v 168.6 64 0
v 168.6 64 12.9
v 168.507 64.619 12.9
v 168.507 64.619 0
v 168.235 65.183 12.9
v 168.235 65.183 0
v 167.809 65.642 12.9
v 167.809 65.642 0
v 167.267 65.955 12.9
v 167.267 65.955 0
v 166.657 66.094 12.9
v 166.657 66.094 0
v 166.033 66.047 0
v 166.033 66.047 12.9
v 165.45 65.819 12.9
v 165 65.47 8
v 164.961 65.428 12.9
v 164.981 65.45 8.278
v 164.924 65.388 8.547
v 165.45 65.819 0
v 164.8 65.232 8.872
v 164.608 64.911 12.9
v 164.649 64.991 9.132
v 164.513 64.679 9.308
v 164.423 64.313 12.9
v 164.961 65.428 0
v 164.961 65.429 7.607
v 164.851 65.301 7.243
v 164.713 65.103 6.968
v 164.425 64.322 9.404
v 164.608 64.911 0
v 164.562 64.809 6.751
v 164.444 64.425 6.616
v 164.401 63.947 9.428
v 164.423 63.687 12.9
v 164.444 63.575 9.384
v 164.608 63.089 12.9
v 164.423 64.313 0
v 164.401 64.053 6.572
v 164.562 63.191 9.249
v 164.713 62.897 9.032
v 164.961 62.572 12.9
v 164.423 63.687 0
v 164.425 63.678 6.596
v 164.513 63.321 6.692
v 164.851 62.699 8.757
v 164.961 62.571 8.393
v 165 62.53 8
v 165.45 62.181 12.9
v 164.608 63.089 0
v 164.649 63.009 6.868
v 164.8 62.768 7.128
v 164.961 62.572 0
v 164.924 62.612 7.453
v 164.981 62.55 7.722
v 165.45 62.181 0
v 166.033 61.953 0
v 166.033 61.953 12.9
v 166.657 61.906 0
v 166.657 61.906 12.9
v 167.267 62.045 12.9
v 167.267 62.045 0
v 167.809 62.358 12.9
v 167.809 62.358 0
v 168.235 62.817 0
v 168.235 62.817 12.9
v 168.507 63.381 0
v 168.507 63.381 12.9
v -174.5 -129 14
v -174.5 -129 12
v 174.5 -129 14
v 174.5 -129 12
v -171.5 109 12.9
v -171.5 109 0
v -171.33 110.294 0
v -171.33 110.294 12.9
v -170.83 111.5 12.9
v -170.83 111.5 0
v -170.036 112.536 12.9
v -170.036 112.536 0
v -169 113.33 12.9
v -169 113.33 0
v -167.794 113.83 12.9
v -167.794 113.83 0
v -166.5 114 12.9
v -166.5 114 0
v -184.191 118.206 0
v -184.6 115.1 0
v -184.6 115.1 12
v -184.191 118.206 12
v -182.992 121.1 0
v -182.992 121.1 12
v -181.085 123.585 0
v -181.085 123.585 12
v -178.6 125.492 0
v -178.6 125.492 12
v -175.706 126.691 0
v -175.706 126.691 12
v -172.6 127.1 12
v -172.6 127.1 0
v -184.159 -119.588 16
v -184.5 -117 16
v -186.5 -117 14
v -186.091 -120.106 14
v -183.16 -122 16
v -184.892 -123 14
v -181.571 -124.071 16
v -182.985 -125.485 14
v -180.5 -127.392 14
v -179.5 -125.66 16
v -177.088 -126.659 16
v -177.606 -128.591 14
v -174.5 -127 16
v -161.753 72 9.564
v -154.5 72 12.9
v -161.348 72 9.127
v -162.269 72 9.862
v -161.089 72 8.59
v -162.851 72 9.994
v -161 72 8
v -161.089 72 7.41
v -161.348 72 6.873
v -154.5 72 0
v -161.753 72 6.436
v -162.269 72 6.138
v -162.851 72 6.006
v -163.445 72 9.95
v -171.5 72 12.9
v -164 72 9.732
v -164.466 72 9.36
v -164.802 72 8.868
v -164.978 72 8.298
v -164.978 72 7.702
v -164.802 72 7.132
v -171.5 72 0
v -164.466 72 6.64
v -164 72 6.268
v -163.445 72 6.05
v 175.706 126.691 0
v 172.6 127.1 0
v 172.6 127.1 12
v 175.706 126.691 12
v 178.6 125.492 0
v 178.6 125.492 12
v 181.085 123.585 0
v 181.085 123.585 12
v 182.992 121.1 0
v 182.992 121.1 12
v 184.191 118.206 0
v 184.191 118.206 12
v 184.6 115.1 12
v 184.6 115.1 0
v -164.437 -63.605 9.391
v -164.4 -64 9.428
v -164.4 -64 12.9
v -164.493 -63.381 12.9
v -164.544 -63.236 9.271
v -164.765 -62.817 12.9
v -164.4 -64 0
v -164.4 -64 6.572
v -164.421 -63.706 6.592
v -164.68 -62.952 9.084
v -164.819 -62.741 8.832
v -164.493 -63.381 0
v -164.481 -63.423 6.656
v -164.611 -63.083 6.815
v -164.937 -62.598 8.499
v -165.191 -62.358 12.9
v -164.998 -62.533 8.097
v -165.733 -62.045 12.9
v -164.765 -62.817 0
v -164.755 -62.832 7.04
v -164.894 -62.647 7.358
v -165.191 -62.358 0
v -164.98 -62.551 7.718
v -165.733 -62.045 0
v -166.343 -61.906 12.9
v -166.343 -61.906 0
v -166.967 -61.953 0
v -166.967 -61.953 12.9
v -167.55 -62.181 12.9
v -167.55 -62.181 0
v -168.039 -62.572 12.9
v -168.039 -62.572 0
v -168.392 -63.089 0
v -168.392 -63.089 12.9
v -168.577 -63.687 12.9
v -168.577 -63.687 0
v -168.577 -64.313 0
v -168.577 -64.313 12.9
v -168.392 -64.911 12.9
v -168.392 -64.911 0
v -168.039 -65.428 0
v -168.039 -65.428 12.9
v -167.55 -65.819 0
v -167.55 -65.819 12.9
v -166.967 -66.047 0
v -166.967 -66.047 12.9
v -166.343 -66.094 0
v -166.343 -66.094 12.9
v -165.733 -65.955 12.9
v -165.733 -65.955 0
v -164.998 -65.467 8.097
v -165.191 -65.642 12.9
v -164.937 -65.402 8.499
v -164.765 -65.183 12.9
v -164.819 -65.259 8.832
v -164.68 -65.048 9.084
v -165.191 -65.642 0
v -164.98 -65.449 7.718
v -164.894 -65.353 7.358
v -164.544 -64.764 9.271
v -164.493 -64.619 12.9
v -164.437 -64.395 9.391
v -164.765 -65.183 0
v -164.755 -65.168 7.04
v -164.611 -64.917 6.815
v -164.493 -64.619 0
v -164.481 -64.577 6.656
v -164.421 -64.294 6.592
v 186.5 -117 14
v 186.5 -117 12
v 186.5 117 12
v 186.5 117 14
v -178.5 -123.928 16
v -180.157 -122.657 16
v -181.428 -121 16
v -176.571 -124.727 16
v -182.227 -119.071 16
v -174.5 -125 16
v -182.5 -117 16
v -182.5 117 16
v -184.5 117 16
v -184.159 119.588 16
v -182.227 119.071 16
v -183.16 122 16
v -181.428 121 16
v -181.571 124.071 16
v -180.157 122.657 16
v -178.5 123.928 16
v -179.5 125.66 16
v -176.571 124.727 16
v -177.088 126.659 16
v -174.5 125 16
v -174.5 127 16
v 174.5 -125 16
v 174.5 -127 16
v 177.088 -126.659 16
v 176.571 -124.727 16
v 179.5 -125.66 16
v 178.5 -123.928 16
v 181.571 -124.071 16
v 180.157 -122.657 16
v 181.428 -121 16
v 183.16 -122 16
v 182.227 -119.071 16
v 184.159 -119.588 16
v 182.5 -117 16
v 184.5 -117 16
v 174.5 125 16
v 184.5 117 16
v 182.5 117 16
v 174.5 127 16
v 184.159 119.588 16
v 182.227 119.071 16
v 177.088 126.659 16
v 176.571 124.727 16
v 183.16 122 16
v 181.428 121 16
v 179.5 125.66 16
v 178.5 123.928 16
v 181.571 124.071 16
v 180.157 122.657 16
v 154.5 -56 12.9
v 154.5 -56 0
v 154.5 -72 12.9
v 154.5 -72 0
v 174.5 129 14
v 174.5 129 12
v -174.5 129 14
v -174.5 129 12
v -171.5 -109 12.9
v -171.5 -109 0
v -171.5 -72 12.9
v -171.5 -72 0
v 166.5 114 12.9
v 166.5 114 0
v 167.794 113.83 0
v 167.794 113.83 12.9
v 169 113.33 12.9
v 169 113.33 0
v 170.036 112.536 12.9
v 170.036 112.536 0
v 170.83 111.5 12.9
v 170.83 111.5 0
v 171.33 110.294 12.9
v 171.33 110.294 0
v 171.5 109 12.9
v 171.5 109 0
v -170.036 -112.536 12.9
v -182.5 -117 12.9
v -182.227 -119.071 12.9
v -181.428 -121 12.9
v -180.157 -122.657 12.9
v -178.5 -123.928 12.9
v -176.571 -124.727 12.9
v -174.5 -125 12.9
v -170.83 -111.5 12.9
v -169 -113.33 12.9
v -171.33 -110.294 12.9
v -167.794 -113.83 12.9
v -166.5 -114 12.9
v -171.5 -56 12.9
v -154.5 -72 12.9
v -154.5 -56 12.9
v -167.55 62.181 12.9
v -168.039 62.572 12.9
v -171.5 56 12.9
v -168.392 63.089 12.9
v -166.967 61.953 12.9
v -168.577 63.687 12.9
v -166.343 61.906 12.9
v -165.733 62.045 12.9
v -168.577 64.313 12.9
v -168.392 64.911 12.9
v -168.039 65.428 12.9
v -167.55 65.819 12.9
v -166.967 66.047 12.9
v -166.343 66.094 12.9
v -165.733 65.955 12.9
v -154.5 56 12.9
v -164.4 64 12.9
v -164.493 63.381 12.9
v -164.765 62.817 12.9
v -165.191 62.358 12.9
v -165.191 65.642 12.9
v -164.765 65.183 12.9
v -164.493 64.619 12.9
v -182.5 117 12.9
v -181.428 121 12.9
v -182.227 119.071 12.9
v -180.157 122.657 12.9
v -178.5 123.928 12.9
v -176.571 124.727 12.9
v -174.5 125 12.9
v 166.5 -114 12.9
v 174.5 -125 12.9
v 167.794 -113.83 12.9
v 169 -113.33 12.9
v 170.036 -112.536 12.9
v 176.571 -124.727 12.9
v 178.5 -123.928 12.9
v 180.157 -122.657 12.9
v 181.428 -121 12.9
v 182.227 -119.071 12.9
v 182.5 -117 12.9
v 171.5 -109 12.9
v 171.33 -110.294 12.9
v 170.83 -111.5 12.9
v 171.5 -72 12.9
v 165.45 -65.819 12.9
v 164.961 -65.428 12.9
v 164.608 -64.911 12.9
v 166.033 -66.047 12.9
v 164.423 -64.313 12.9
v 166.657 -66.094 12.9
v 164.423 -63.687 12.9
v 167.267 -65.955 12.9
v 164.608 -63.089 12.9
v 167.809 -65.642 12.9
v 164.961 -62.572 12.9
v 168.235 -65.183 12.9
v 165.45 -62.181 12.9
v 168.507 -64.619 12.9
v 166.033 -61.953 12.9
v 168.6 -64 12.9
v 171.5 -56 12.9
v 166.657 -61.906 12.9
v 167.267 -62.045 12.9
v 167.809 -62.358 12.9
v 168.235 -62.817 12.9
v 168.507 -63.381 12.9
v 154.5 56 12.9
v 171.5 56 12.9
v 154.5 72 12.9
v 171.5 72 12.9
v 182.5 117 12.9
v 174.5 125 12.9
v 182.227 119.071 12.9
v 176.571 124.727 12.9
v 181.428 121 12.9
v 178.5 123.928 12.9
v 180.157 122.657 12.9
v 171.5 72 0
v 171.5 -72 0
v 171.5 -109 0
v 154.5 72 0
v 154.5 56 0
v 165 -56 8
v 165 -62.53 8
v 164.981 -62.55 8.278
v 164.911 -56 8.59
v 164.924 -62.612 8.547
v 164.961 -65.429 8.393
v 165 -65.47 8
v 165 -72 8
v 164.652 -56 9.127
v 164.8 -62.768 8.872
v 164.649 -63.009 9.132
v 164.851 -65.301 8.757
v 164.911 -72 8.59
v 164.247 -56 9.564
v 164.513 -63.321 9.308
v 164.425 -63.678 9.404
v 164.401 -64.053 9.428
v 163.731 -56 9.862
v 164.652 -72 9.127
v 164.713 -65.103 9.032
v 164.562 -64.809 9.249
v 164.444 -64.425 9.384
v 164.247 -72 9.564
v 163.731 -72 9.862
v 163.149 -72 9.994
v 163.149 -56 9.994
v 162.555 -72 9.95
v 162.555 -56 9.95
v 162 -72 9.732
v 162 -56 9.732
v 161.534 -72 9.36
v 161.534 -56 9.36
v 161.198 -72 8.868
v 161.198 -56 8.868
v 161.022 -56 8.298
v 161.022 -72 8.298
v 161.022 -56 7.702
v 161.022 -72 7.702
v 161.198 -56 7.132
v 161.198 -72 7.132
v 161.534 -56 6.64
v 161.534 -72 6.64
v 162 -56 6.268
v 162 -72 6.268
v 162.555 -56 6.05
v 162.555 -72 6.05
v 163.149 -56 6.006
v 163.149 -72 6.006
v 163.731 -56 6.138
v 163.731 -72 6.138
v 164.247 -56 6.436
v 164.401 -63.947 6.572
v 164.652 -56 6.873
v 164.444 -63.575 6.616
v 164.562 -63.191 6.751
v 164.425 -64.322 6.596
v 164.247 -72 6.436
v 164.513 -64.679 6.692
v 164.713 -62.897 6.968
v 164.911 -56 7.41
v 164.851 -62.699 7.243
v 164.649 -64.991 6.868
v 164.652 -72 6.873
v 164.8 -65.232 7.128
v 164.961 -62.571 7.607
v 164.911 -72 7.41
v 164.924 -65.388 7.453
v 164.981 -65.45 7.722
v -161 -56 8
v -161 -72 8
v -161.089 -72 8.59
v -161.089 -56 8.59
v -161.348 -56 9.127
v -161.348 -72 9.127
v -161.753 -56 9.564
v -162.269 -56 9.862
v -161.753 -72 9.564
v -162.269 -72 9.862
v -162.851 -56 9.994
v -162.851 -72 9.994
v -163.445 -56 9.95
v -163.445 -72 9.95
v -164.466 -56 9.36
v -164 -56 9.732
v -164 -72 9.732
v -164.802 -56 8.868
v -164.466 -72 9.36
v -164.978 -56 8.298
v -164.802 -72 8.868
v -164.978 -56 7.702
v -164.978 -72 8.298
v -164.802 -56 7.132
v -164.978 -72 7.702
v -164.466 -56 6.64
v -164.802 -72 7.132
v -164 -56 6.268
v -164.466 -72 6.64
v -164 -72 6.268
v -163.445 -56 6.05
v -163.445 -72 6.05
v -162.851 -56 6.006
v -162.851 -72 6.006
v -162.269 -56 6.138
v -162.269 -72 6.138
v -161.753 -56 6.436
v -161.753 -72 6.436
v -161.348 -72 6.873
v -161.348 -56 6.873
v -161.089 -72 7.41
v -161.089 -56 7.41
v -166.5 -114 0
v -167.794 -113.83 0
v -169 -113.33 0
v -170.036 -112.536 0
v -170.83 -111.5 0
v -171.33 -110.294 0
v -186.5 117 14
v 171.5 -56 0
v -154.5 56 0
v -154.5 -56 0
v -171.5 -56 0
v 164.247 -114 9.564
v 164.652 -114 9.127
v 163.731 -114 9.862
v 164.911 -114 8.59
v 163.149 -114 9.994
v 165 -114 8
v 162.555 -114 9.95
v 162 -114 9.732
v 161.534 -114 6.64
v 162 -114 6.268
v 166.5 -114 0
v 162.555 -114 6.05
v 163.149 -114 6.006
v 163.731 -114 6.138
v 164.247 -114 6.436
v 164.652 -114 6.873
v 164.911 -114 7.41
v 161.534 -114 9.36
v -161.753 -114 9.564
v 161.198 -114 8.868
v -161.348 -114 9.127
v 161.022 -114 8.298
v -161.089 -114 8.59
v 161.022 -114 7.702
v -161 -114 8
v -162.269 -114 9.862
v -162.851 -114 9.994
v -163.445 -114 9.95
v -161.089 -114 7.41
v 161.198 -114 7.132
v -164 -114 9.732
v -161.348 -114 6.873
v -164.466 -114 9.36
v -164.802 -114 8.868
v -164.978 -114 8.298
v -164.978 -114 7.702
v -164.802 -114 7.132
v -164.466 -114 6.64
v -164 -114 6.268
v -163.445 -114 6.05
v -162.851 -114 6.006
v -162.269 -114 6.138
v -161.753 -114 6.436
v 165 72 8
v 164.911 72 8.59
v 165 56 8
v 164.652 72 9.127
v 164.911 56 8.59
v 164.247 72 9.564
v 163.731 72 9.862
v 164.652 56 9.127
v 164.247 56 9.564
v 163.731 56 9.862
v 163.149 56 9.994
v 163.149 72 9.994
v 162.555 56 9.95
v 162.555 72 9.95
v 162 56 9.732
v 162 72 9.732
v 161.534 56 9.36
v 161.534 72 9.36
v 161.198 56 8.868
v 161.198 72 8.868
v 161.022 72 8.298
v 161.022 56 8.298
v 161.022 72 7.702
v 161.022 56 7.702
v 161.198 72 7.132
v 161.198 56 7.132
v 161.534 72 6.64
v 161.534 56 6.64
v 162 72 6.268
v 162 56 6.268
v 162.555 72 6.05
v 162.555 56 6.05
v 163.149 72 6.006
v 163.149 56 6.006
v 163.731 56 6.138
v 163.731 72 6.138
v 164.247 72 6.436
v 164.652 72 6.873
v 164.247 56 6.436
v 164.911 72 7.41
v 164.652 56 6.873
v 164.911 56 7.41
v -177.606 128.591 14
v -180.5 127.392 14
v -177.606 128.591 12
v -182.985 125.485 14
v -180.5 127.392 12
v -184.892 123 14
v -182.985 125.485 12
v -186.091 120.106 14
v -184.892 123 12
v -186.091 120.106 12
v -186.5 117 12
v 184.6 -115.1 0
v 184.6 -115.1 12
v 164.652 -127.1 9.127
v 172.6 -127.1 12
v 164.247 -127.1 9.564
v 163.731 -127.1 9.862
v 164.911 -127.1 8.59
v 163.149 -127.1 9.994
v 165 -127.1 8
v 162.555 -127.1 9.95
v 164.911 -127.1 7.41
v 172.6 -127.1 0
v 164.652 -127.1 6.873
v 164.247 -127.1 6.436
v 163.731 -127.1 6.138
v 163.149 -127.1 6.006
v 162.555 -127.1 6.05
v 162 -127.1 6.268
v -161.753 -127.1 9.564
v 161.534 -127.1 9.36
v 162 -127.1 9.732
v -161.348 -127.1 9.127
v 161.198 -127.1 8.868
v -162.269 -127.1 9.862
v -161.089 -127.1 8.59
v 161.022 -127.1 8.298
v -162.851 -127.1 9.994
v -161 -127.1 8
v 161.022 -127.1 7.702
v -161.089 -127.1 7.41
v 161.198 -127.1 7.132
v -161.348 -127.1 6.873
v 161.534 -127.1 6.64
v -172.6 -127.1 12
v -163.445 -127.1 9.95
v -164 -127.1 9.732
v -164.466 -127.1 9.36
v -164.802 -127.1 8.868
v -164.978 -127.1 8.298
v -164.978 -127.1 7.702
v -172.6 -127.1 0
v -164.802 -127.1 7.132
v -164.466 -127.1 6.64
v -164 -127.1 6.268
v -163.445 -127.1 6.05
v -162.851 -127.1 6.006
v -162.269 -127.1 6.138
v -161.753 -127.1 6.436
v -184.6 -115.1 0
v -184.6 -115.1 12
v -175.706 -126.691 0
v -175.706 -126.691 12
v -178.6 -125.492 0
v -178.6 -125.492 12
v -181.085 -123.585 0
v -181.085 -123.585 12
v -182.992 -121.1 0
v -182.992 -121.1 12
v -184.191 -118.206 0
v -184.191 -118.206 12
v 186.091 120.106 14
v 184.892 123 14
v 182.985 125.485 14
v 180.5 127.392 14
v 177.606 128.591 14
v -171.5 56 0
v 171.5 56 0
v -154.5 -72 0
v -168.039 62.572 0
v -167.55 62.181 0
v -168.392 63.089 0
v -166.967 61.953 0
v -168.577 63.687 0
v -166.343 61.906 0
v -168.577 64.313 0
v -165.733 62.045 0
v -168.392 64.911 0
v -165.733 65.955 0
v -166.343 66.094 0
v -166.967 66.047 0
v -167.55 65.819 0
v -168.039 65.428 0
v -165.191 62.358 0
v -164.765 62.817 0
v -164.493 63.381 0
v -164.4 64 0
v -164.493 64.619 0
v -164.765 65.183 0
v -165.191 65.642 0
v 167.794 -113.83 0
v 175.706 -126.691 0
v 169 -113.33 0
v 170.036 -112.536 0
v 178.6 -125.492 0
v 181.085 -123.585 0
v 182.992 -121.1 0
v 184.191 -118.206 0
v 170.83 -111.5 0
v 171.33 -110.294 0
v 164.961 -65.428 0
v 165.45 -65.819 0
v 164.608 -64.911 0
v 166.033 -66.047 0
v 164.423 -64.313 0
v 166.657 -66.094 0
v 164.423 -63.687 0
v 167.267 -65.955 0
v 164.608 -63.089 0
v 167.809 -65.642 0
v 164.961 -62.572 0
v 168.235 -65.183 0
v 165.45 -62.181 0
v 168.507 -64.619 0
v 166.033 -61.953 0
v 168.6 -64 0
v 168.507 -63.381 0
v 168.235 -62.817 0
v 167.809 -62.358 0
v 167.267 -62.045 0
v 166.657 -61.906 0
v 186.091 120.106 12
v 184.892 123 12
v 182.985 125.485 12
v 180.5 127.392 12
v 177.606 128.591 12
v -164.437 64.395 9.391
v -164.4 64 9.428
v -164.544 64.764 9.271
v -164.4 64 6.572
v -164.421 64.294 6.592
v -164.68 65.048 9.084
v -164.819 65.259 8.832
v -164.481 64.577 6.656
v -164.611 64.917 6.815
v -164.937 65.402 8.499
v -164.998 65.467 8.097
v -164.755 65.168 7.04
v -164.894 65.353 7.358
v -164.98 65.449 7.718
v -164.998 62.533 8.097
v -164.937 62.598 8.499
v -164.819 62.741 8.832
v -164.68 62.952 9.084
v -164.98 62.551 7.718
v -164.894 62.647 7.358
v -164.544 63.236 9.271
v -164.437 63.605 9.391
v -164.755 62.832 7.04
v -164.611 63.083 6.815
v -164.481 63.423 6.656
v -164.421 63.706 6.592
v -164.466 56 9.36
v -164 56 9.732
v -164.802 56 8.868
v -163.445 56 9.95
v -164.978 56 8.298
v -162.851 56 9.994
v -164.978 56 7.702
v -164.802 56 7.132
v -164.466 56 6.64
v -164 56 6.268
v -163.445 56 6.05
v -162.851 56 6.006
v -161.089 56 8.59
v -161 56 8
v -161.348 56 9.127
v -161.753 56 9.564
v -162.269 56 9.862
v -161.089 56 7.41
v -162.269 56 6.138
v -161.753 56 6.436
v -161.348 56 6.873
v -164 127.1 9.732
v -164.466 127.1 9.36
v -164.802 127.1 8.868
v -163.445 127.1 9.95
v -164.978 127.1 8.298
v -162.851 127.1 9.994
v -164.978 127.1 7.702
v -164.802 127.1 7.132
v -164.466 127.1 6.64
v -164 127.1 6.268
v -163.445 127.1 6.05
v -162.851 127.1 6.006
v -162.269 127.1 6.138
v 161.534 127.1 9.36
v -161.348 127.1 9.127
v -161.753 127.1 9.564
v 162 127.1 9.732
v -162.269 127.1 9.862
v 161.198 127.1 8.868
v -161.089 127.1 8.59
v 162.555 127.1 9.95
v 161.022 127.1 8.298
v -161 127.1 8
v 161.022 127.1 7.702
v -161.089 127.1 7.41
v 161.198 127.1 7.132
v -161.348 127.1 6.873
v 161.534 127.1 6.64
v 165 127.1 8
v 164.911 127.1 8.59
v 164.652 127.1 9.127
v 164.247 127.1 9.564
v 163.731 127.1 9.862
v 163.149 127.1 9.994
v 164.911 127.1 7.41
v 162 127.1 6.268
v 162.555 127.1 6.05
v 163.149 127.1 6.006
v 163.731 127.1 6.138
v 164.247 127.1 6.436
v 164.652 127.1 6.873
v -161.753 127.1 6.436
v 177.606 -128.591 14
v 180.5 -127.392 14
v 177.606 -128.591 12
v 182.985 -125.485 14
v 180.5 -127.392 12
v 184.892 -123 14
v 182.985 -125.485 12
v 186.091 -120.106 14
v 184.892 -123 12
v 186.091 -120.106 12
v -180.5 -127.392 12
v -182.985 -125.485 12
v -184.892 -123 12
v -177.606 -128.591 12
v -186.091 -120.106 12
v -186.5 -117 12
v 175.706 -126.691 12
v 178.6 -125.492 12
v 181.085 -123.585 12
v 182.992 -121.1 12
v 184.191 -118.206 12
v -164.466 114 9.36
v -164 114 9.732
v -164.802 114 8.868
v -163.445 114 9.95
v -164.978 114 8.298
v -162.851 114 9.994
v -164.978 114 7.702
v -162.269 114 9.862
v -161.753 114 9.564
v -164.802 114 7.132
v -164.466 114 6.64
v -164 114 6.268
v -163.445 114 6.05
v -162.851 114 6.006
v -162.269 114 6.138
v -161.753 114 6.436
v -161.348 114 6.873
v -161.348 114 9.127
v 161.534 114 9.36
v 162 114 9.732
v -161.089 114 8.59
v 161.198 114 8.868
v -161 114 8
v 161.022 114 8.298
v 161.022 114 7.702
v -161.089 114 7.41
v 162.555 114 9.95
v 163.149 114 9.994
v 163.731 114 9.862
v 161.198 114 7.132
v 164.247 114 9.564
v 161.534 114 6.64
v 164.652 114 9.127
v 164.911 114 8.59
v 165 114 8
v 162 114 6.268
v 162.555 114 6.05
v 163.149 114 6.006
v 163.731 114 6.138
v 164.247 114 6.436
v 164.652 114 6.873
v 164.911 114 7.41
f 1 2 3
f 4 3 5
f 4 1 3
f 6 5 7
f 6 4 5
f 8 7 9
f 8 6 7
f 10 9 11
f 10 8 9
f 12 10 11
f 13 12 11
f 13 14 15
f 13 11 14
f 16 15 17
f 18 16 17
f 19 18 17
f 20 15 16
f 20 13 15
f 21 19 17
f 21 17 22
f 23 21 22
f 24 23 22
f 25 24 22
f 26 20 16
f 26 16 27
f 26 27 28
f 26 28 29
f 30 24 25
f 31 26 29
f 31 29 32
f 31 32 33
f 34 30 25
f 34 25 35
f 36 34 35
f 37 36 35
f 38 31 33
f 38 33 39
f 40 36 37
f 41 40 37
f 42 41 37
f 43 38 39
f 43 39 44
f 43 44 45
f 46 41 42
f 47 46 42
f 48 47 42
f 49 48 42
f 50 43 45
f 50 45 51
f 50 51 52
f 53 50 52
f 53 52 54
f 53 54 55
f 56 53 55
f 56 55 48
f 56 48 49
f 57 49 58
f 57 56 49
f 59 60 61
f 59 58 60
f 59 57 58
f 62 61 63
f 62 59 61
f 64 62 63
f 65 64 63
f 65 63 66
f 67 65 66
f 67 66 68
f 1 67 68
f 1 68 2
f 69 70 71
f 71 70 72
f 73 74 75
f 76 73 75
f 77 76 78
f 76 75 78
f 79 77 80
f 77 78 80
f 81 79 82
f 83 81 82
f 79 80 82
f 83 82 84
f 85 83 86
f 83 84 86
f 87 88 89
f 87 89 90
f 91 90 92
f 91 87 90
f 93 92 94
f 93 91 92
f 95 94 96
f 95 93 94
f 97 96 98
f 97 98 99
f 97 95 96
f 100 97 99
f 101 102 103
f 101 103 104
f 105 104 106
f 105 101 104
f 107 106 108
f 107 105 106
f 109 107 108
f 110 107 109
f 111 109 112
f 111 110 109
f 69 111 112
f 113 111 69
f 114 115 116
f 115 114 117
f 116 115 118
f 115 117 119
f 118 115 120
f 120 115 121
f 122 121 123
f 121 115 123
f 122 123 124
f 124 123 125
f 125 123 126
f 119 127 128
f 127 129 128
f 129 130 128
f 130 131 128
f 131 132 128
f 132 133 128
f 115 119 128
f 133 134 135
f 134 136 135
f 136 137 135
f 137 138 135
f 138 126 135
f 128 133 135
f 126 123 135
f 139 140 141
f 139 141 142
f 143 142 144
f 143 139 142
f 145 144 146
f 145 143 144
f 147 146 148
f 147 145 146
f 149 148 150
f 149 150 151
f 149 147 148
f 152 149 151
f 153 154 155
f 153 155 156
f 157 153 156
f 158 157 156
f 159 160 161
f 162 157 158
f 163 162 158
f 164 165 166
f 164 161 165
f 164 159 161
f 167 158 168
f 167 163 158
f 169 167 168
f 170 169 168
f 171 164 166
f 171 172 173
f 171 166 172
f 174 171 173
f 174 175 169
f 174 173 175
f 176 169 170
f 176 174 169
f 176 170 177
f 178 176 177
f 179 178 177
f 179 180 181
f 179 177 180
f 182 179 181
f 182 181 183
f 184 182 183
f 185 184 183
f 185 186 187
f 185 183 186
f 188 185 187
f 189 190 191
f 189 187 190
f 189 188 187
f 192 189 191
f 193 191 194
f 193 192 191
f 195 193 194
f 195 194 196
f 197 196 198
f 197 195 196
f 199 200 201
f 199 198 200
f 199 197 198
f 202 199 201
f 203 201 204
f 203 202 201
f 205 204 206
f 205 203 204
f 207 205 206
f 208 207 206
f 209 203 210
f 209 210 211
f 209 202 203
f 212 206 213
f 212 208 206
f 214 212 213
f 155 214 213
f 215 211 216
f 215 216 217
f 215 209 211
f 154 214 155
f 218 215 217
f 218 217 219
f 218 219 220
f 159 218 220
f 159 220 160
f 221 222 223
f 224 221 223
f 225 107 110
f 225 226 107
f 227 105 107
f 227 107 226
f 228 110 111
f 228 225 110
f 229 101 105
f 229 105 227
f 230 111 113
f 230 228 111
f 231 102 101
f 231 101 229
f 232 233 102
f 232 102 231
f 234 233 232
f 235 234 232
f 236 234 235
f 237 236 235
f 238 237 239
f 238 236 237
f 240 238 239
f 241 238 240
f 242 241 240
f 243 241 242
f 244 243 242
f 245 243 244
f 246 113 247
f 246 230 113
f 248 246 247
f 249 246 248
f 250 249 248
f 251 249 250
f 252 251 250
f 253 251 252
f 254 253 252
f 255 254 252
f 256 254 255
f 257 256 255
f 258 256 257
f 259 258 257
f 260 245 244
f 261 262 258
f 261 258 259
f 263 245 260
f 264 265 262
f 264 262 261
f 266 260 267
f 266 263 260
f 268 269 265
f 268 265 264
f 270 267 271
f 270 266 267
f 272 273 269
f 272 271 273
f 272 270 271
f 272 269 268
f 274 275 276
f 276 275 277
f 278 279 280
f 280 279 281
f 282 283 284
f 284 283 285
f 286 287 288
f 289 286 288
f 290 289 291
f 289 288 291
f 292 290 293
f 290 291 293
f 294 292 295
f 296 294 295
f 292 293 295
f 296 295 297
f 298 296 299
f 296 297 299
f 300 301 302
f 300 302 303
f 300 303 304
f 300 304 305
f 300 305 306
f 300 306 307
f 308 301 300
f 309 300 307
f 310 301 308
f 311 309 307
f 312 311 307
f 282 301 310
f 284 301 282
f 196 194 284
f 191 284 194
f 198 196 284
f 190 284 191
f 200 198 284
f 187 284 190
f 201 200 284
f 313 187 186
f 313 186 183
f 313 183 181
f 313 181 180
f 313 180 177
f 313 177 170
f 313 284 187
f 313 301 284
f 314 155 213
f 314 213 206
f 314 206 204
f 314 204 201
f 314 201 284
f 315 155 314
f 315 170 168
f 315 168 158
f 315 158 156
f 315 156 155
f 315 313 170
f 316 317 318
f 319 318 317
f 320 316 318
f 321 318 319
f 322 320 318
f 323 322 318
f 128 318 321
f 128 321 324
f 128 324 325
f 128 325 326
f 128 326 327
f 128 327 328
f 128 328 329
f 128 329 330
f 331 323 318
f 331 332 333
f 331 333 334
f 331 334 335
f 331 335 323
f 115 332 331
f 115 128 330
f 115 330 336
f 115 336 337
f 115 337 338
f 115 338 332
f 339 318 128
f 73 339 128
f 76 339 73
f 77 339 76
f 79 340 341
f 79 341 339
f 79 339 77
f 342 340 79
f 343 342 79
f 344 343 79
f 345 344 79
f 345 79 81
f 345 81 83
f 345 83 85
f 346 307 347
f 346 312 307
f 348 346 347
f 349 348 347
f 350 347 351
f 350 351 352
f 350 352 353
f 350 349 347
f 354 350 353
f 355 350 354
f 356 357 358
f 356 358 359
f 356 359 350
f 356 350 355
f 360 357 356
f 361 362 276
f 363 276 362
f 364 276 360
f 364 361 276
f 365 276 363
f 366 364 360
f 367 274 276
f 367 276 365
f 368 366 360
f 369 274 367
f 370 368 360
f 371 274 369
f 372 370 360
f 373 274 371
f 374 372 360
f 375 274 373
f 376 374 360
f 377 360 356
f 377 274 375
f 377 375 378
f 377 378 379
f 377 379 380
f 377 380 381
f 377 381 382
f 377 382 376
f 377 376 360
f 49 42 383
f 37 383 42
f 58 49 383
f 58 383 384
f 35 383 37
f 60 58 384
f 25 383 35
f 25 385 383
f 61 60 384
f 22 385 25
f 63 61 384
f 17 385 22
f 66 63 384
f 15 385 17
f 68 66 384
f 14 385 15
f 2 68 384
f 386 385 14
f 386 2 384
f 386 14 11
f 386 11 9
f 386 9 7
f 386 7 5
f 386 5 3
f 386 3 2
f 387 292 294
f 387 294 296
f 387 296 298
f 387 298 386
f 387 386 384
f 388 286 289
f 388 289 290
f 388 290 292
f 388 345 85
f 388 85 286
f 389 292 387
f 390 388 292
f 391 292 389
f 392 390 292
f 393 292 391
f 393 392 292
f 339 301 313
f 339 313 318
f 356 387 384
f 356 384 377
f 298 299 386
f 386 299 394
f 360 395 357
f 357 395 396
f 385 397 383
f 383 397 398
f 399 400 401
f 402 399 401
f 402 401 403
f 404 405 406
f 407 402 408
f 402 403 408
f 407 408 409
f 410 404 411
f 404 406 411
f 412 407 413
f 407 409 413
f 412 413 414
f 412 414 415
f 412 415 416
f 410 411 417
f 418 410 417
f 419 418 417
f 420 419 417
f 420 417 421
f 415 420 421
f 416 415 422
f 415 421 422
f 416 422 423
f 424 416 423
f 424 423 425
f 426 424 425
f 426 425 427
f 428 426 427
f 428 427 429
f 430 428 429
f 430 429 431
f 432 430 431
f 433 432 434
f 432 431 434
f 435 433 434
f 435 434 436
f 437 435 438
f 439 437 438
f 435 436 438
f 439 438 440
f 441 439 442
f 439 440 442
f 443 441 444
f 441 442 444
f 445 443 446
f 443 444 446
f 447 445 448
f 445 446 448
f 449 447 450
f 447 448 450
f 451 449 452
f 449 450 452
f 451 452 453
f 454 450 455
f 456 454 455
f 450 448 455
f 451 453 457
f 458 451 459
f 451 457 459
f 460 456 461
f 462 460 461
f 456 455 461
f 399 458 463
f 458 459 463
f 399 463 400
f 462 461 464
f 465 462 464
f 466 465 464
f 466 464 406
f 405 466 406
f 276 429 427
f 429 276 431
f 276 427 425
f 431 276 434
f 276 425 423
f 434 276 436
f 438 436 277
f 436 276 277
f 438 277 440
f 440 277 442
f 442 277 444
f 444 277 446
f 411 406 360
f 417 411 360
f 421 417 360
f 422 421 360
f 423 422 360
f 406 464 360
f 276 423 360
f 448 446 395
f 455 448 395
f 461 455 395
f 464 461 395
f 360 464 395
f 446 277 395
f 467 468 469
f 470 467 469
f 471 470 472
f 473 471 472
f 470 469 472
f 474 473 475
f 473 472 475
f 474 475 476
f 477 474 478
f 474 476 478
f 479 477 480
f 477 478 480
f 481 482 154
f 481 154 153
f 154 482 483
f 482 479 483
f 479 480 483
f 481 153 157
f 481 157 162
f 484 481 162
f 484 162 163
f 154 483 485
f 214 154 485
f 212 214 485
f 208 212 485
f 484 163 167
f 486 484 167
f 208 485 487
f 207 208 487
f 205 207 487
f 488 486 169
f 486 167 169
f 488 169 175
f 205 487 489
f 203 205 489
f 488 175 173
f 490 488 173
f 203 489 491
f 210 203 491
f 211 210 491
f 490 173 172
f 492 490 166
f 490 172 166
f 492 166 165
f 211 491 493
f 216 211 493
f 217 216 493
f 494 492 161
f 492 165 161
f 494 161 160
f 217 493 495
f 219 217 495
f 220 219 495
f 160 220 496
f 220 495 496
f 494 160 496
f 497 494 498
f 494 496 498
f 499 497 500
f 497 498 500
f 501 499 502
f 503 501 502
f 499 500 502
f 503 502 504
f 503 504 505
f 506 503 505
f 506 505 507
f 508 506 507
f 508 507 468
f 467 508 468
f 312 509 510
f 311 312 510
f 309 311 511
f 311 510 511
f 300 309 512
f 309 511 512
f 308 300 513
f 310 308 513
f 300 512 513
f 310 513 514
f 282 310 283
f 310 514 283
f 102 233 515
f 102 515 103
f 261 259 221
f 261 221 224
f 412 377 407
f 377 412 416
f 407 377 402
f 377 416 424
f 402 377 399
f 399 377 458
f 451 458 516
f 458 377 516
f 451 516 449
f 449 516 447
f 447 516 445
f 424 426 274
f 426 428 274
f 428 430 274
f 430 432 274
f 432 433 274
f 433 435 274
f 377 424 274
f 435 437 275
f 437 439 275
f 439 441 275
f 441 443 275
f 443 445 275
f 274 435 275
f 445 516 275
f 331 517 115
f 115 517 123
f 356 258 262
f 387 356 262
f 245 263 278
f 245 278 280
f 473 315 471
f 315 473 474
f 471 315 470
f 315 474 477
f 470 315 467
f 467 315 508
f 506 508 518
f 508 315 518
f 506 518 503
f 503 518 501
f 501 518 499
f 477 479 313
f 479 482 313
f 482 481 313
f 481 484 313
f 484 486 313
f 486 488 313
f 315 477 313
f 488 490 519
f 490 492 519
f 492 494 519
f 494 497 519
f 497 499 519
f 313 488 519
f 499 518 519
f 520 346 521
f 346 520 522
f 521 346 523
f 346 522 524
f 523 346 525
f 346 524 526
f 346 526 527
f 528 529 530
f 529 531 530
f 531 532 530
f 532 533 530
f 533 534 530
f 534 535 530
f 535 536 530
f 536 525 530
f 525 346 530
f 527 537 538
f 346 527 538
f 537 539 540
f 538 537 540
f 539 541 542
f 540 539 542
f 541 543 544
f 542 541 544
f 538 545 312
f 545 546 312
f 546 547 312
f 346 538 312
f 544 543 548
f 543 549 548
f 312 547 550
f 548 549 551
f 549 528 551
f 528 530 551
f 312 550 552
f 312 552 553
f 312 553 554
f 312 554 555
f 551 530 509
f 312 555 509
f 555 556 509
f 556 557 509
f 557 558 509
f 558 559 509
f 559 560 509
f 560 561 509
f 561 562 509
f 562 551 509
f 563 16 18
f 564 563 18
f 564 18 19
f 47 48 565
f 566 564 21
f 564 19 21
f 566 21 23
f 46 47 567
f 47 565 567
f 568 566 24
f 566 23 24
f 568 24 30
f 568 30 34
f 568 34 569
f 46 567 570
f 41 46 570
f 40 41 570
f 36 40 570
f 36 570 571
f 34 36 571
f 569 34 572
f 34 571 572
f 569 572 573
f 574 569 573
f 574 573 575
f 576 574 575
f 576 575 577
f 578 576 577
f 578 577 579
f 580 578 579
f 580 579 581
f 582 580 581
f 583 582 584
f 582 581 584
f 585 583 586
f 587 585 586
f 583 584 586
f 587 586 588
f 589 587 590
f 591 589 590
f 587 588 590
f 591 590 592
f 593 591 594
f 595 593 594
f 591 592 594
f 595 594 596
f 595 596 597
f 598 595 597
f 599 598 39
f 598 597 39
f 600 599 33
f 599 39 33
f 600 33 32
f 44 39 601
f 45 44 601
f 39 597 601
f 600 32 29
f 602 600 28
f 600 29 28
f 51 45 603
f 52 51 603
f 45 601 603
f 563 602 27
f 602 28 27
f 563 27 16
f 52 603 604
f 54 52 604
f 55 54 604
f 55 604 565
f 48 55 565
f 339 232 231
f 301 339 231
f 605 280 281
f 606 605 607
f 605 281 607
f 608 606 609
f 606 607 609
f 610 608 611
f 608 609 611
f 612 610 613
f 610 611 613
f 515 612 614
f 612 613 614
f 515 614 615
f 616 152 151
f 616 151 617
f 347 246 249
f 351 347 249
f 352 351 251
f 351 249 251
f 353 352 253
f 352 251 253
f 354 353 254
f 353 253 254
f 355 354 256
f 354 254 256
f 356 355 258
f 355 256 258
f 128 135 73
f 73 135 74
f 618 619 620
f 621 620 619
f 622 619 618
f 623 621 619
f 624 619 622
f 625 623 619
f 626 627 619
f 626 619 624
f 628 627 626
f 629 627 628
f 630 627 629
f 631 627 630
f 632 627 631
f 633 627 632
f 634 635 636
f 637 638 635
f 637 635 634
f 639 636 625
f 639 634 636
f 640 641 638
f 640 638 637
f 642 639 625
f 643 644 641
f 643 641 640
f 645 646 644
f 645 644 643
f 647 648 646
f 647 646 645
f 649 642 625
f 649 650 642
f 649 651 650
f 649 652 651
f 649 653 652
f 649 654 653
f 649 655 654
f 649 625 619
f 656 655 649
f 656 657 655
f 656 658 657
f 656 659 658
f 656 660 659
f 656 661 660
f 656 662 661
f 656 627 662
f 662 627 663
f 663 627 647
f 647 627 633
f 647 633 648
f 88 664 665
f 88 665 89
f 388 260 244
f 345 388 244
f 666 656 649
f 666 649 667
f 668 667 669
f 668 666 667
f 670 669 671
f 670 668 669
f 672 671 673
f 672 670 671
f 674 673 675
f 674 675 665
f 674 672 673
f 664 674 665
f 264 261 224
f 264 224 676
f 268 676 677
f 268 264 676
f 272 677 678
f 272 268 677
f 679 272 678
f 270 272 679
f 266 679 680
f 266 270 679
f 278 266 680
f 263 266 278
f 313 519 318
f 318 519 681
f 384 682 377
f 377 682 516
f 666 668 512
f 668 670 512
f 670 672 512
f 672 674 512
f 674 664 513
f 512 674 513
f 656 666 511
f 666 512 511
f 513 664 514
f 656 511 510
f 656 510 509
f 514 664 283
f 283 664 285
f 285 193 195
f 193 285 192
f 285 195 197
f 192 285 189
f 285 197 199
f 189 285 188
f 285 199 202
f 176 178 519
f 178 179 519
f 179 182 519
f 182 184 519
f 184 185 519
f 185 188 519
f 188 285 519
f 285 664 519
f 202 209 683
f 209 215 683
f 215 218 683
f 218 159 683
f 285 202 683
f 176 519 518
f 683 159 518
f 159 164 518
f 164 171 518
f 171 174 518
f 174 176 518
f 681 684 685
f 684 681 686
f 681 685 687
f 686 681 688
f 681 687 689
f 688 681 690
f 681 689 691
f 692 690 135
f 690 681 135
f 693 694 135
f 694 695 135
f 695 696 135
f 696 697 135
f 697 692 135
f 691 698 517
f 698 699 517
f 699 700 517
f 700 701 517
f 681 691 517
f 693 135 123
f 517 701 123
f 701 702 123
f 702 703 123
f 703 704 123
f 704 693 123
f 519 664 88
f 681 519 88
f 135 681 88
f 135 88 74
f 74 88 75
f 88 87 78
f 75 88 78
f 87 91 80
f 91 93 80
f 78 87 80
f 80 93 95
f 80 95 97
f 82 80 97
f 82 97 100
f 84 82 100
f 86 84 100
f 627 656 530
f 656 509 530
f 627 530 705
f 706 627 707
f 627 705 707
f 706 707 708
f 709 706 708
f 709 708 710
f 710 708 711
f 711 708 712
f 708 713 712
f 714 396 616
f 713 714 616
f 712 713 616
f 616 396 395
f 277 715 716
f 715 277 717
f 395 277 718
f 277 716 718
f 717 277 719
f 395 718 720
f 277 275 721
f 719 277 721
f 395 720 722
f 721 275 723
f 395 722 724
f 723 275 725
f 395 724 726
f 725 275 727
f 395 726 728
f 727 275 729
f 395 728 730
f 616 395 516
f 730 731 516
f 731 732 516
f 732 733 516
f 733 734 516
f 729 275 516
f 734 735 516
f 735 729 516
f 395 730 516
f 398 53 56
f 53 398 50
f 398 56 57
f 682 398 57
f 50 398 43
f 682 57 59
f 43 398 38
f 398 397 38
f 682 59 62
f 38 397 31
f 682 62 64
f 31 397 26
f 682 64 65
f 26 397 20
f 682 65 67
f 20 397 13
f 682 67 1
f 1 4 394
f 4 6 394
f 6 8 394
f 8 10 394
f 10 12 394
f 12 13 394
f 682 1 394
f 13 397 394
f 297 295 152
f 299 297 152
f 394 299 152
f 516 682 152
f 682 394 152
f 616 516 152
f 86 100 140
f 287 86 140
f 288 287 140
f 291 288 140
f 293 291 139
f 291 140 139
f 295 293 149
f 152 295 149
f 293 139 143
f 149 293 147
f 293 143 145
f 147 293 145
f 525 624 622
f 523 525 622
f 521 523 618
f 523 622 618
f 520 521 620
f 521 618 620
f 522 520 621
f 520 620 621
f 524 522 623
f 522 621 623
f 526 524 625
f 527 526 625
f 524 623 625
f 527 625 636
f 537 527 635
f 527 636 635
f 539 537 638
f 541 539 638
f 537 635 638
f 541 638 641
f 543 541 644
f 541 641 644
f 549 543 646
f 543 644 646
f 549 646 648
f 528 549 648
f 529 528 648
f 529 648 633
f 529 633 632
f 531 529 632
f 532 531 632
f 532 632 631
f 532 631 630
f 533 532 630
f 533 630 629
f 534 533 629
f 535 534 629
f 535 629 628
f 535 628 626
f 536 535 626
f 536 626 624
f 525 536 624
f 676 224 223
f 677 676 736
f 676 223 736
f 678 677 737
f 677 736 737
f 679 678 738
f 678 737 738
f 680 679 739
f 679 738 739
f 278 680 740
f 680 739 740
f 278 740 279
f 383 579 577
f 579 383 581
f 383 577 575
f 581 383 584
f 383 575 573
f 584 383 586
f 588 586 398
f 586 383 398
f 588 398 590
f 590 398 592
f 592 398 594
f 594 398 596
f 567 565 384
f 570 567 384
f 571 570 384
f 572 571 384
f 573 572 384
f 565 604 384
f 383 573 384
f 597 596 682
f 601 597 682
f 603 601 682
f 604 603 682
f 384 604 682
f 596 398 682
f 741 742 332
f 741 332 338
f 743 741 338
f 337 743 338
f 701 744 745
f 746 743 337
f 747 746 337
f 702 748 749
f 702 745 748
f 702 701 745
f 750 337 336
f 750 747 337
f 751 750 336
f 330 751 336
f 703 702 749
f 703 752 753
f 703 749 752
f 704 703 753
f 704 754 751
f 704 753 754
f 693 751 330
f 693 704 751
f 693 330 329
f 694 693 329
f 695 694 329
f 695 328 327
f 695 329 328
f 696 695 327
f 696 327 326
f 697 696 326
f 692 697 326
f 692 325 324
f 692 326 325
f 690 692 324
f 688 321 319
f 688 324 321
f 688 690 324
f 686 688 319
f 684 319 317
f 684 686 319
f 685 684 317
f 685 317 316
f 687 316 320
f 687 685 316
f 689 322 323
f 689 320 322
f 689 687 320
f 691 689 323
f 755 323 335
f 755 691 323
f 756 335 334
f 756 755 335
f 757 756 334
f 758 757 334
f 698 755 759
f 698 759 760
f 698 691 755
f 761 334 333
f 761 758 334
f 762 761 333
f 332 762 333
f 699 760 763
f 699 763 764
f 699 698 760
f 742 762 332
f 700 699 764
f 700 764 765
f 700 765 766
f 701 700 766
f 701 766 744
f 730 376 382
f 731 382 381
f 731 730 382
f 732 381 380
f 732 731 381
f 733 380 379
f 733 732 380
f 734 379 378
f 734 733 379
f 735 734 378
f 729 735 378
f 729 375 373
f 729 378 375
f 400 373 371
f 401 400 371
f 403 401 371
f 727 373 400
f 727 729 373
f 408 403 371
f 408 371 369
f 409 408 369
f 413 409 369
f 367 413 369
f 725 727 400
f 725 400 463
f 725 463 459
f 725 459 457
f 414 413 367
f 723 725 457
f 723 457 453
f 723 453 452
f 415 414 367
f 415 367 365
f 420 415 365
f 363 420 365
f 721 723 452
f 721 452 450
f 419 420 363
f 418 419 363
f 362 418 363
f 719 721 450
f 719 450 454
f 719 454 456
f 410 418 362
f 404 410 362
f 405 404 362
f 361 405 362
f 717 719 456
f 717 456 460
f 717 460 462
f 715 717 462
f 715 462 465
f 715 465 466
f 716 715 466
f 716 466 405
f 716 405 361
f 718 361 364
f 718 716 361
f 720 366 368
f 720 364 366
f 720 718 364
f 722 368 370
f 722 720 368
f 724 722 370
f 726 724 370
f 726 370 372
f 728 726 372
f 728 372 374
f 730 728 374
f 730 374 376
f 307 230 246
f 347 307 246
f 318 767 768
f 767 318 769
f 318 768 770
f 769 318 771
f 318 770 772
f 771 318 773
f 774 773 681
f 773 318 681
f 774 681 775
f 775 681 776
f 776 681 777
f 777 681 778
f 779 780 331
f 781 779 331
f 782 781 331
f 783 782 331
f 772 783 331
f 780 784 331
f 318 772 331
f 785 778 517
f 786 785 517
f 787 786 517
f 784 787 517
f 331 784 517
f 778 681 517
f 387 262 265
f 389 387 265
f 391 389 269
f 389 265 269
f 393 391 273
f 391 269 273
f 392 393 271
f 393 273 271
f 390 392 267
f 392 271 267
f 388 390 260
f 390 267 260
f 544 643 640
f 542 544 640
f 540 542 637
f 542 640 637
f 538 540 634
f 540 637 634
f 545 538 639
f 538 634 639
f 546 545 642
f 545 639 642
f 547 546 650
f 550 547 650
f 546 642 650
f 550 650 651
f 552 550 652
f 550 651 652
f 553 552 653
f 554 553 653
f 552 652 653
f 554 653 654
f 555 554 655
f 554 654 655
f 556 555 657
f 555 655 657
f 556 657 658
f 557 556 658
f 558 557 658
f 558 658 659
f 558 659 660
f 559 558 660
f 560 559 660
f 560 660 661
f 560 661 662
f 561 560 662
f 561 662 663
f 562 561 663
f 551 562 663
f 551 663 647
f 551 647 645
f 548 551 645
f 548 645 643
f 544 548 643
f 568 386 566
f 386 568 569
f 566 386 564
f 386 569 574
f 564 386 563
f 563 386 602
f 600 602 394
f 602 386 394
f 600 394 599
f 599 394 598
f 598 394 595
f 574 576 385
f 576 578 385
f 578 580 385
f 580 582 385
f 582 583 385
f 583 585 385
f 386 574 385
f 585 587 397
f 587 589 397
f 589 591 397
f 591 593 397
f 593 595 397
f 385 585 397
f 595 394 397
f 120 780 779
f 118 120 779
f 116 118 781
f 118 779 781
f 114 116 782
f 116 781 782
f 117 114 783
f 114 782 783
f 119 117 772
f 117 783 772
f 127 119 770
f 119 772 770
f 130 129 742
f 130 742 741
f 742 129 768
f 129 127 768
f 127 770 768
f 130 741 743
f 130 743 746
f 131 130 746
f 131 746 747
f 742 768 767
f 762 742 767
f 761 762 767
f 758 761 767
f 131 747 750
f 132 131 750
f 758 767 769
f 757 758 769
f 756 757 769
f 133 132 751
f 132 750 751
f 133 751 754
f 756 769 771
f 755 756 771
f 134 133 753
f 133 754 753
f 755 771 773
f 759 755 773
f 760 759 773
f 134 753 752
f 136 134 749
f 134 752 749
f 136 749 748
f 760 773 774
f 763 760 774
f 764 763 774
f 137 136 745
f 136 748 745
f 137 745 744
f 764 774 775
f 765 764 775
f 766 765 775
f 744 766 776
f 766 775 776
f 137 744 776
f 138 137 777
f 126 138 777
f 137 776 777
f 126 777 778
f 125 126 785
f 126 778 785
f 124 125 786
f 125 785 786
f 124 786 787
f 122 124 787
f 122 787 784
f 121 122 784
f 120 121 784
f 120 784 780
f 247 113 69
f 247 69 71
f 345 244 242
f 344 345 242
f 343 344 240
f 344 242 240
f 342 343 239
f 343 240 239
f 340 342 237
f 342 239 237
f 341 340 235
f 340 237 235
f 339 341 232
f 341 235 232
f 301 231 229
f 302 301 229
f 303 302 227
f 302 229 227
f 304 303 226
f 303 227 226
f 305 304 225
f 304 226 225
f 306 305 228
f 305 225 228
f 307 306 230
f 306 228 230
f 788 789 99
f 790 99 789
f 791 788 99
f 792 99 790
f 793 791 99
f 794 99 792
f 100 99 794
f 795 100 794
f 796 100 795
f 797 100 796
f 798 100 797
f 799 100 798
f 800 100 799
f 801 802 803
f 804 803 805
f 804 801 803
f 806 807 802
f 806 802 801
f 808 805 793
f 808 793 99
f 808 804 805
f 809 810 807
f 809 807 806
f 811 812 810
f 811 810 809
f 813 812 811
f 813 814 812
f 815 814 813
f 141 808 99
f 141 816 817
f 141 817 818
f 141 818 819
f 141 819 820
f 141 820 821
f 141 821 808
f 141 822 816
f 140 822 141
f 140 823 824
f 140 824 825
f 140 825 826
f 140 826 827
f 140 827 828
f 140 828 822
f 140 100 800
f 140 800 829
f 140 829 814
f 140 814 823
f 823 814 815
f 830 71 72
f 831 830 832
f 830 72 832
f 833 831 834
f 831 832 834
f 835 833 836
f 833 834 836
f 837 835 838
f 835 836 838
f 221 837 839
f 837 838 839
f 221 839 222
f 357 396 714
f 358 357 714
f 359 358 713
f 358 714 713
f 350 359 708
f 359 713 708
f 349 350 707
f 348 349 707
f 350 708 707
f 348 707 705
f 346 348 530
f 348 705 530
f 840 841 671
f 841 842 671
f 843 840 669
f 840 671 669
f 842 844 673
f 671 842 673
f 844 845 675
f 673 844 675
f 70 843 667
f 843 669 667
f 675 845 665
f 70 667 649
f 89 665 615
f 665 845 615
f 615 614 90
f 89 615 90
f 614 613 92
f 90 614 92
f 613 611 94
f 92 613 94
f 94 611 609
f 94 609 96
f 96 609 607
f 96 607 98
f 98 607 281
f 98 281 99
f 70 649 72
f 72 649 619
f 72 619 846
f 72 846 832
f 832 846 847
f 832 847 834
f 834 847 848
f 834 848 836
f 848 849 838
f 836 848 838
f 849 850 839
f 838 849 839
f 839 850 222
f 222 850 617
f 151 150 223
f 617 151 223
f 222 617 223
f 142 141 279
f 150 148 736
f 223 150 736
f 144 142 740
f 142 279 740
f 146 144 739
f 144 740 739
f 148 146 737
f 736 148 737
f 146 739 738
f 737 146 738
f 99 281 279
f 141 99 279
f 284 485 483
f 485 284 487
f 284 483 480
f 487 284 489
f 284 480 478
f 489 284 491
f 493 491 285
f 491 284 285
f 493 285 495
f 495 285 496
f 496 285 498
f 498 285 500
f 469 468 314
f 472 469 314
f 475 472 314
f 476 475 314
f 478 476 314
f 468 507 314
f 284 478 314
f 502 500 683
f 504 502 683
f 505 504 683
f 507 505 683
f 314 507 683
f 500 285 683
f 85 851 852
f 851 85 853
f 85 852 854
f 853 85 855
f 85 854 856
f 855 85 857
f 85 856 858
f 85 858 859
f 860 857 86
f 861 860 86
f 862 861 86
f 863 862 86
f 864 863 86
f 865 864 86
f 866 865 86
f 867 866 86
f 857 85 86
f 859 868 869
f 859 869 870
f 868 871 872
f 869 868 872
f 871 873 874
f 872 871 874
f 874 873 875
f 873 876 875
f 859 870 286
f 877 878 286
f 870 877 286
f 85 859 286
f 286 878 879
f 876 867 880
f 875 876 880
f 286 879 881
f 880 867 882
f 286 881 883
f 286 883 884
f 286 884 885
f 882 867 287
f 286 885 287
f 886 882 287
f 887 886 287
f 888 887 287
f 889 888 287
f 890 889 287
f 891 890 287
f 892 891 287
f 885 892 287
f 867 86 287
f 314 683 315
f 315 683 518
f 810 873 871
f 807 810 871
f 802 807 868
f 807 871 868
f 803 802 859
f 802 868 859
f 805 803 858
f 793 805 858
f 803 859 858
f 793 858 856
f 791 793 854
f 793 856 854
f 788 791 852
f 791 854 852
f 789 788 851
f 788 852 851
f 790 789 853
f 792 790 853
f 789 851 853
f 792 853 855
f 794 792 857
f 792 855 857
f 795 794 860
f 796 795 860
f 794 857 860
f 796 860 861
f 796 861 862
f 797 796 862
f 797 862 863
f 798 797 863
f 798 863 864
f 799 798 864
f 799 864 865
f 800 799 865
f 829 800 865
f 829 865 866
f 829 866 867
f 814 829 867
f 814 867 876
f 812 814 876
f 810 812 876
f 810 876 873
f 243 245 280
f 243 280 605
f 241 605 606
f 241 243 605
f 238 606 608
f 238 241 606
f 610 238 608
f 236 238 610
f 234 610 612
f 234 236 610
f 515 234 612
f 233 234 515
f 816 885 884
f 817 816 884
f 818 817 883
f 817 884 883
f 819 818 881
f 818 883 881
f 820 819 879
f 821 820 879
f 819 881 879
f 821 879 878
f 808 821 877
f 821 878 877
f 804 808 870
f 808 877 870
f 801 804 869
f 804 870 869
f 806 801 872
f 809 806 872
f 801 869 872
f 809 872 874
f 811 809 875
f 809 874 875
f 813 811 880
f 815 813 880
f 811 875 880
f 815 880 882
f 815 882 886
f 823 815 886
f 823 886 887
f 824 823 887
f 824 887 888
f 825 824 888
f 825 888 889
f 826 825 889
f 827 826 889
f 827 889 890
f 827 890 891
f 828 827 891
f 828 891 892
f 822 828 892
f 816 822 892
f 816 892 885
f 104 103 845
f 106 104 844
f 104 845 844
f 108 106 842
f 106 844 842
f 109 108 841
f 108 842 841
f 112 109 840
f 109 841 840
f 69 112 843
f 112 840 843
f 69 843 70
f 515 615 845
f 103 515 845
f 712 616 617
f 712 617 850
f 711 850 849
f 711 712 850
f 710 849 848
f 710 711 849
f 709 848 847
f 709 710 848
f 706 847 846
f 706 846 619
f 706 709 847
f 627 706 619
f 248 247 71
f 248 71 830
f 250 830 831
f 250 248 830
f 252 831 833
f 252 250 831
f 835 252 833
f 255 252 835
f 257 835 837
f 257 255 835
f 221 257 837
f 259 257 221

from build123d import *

# Parameters (mm, degrees)
F0_R     = 2.1
F1_DEPTH = 16
F2_SIZE  = 2
F4_DEPTH = 3.1
F6_DEPTH = 12
F7_R     = 2
F8_DEPTH = 256.101


with BuildPart() as f1:
    # F0 (on Top) → F1 (new body)
    with BuildSketch(Plane.XY):
        with BuildLine():
            Line((174.5, 129), (-174.5, 129))
            ThreePointArc((-174.5, 129), (-182.985281, 125.485281), (-186.5, 117))
            Line((-186.5, 117), (-186.5, -117))
            ThreePointArc((-186.5, -117), (-182.985281, -125.485281), (-174.5, -129))
            Line((-174.5, -129), (174.5, -129))
            ThreePointArc((174.5, -129), (182.985281, -125.485281), (186.5, -117))
            Line((186.5, -117), (186.5, 117))
            ThreePointArc((186.5, 117), (182.985281, 125.485281), (174.5, 129))
        make_face()
        with Locations((-166.5, -64)):
            Circle(F0_R, mode=Mode.SUBTRACT)
        with Locations((166.5, -64)):
            Circle(F0_R, mode=Mode.SUBTRACT)
        with Locations((-166.5, 64)):
            Circle(F0_R, mode=Mode.SUBTRACT)
        with BuildLine():
            ThreePointArc((-171.5, 109), (-170.035534, 112.535534), (-166.5, 114))
            Line((-166.5, 114), (166.5, 114))
            ThreePointArc((166.5, 114), (170.035534, 112.535534), (171.5, 109))
            Line((171.5, 109), (171.5, 72))
            Line((171.5, 72), (154.5, 72))
            Line((154.5, 72), (154.5, 56))
            Line((154.5, 56), (171.5, 56))
            Line((171.5, 56), (171.5, -56))
            Line((171.5, -56), (154.5, -56))
            Line((154.5, -56), (154.5, -72))
            Line((154.5, -72), (171.5, -72))
            Line((171.5, -72), (171.5, -109))
            ThreePointArc((171.5, -109), (170.035534, -112.535534), (166.5, -114))
            Line((166.5, -114), (-166.5, -114))
            ThreePointArc((-166.5, -114), (-170.035534, -112.535534), (-171.5, -109))
            Line((-171.5, -109), (-171.5, -72))
            Line((-171.5, -72), (-154.5, -72))
            Line((-154.5, -72), (-154.5, -56))
            Line((-154.5, -56), (-171.5, -56))
            Line((-171.5, -56), (-171.5, 56))
            Line((-171.5, 56), (-154.5, 56))
            Line((-154.5, 56), (-154.5, 72))
            Line((-154.5, 72), (-171.5, 72))
            Line((-171.5, 72), (-171.5, 109))
        make_face(mode=Mode.SUBTRACT)
        with Locations((166.5, 64)):
            Circle(F0_R, mode=Mode.SUBTRACT)
    extrude(amount=F1_DEPTH)

    # F2
    f2_edges = [f1.edges().sort_by_distance(p)[0] for p in [
        (0, -129, 16),
    ]]
    chamfer(f2_edges, length=F2_SIZE)

    # F3 (on face) → F4 (cut)
    with BuildSketch(Plane.XY.offset(16)):
        with BuildLine():
            ThreePointArc((-174.5, 125), (-180.156854, 122.656854), (-182.5, 117))
            Line((-182.5, 117), (-182.5, -117))
            ThreePointArc((-182.5, -117), (-180.156854, -122.656854), (-174.5, -125))
            Line((-174.5, -125), (174.5, -125))
            ThreePointArc((174.5, -125), (180.156854, -122.656854), (182.5, -117))
            Line((182.5, -117), (182.5, 117))
            ThreePointArc((182.5, 117), (180.156854, 122.656854), (174.5, 125))
            Line((174.5, 125), (-174.5, 125))
        make_face()
    extrude(amount=-F4_DEPTH, mode=Mode.SUBTRACT)

    # F5 (on face) → F6 (cut)
    with BuildSketch(Plane.XY):
        with BuildLine():
            Line((172.6, 132.1), (-172.6, 132.1))
            ThreePointArc((-172.6, 132.1), (-184.620815, 127.120815), (-189.6, 115.1))
            Line((-189.6, 115.1), (-189.6, -115.1))
            ThreePointArc((-189.6, -115.1), (-184.620815, -127.120815), (-172.6, -132.1))
            Line((-172.6, -132.1), (172.6, -132.1))
            ThreePointArc((172.6, -132.1), (184.620815, -127.120815), (189.6, -115.1))
            Line((189.6, -115.1), (189.6, 115.1))
            ThreePointArc((189.6, 115.1), (184.620815, 127.120815), (172.6, 132.1))
        make_face()
        with BuildLine():
            ThreePointArc((-184.6, 115.1), (-181.085281, 123.585281), (-172.6, 127.1))
            Line((-172.6, 127.1), (172.6, 127.1))
            ThreePointArc((172.6, 127.1), (181.085281, 123.585281), (184.6, 115.1))
            Line((184.6, 115.1), (184.6, -115.1))
            ThreePointArc((184.6, -115.1), (181.085281, -123.585281), (172.6, -127.1))
            Line((172.6, -127.1), (-172.6, -127.1))
            ThreePointArc((-172.6, -127.1), (-181.085281, -123.585281), (-184.6, -115.1))
            Line((-184.6, -115.1), (-184.6, 115.1))
        make_face(mode=Mode.SUBTRACT)
    extrude(amount=F6_DEPTH, mode=Mode.SUBTRACT)

    # F7 (on face) → F8 (cut, through all)
    with BuildSketch(Plane.XZ.offset(127.1)):
        with Locations((-163, 8)):
            Circle(F7_R)
        with Locations((163, 8)):
            Circle(F7_R)
    extrude(amount=-F8_DEPTH, mode=Mode.SUBTRACT)


solid = f1.part
